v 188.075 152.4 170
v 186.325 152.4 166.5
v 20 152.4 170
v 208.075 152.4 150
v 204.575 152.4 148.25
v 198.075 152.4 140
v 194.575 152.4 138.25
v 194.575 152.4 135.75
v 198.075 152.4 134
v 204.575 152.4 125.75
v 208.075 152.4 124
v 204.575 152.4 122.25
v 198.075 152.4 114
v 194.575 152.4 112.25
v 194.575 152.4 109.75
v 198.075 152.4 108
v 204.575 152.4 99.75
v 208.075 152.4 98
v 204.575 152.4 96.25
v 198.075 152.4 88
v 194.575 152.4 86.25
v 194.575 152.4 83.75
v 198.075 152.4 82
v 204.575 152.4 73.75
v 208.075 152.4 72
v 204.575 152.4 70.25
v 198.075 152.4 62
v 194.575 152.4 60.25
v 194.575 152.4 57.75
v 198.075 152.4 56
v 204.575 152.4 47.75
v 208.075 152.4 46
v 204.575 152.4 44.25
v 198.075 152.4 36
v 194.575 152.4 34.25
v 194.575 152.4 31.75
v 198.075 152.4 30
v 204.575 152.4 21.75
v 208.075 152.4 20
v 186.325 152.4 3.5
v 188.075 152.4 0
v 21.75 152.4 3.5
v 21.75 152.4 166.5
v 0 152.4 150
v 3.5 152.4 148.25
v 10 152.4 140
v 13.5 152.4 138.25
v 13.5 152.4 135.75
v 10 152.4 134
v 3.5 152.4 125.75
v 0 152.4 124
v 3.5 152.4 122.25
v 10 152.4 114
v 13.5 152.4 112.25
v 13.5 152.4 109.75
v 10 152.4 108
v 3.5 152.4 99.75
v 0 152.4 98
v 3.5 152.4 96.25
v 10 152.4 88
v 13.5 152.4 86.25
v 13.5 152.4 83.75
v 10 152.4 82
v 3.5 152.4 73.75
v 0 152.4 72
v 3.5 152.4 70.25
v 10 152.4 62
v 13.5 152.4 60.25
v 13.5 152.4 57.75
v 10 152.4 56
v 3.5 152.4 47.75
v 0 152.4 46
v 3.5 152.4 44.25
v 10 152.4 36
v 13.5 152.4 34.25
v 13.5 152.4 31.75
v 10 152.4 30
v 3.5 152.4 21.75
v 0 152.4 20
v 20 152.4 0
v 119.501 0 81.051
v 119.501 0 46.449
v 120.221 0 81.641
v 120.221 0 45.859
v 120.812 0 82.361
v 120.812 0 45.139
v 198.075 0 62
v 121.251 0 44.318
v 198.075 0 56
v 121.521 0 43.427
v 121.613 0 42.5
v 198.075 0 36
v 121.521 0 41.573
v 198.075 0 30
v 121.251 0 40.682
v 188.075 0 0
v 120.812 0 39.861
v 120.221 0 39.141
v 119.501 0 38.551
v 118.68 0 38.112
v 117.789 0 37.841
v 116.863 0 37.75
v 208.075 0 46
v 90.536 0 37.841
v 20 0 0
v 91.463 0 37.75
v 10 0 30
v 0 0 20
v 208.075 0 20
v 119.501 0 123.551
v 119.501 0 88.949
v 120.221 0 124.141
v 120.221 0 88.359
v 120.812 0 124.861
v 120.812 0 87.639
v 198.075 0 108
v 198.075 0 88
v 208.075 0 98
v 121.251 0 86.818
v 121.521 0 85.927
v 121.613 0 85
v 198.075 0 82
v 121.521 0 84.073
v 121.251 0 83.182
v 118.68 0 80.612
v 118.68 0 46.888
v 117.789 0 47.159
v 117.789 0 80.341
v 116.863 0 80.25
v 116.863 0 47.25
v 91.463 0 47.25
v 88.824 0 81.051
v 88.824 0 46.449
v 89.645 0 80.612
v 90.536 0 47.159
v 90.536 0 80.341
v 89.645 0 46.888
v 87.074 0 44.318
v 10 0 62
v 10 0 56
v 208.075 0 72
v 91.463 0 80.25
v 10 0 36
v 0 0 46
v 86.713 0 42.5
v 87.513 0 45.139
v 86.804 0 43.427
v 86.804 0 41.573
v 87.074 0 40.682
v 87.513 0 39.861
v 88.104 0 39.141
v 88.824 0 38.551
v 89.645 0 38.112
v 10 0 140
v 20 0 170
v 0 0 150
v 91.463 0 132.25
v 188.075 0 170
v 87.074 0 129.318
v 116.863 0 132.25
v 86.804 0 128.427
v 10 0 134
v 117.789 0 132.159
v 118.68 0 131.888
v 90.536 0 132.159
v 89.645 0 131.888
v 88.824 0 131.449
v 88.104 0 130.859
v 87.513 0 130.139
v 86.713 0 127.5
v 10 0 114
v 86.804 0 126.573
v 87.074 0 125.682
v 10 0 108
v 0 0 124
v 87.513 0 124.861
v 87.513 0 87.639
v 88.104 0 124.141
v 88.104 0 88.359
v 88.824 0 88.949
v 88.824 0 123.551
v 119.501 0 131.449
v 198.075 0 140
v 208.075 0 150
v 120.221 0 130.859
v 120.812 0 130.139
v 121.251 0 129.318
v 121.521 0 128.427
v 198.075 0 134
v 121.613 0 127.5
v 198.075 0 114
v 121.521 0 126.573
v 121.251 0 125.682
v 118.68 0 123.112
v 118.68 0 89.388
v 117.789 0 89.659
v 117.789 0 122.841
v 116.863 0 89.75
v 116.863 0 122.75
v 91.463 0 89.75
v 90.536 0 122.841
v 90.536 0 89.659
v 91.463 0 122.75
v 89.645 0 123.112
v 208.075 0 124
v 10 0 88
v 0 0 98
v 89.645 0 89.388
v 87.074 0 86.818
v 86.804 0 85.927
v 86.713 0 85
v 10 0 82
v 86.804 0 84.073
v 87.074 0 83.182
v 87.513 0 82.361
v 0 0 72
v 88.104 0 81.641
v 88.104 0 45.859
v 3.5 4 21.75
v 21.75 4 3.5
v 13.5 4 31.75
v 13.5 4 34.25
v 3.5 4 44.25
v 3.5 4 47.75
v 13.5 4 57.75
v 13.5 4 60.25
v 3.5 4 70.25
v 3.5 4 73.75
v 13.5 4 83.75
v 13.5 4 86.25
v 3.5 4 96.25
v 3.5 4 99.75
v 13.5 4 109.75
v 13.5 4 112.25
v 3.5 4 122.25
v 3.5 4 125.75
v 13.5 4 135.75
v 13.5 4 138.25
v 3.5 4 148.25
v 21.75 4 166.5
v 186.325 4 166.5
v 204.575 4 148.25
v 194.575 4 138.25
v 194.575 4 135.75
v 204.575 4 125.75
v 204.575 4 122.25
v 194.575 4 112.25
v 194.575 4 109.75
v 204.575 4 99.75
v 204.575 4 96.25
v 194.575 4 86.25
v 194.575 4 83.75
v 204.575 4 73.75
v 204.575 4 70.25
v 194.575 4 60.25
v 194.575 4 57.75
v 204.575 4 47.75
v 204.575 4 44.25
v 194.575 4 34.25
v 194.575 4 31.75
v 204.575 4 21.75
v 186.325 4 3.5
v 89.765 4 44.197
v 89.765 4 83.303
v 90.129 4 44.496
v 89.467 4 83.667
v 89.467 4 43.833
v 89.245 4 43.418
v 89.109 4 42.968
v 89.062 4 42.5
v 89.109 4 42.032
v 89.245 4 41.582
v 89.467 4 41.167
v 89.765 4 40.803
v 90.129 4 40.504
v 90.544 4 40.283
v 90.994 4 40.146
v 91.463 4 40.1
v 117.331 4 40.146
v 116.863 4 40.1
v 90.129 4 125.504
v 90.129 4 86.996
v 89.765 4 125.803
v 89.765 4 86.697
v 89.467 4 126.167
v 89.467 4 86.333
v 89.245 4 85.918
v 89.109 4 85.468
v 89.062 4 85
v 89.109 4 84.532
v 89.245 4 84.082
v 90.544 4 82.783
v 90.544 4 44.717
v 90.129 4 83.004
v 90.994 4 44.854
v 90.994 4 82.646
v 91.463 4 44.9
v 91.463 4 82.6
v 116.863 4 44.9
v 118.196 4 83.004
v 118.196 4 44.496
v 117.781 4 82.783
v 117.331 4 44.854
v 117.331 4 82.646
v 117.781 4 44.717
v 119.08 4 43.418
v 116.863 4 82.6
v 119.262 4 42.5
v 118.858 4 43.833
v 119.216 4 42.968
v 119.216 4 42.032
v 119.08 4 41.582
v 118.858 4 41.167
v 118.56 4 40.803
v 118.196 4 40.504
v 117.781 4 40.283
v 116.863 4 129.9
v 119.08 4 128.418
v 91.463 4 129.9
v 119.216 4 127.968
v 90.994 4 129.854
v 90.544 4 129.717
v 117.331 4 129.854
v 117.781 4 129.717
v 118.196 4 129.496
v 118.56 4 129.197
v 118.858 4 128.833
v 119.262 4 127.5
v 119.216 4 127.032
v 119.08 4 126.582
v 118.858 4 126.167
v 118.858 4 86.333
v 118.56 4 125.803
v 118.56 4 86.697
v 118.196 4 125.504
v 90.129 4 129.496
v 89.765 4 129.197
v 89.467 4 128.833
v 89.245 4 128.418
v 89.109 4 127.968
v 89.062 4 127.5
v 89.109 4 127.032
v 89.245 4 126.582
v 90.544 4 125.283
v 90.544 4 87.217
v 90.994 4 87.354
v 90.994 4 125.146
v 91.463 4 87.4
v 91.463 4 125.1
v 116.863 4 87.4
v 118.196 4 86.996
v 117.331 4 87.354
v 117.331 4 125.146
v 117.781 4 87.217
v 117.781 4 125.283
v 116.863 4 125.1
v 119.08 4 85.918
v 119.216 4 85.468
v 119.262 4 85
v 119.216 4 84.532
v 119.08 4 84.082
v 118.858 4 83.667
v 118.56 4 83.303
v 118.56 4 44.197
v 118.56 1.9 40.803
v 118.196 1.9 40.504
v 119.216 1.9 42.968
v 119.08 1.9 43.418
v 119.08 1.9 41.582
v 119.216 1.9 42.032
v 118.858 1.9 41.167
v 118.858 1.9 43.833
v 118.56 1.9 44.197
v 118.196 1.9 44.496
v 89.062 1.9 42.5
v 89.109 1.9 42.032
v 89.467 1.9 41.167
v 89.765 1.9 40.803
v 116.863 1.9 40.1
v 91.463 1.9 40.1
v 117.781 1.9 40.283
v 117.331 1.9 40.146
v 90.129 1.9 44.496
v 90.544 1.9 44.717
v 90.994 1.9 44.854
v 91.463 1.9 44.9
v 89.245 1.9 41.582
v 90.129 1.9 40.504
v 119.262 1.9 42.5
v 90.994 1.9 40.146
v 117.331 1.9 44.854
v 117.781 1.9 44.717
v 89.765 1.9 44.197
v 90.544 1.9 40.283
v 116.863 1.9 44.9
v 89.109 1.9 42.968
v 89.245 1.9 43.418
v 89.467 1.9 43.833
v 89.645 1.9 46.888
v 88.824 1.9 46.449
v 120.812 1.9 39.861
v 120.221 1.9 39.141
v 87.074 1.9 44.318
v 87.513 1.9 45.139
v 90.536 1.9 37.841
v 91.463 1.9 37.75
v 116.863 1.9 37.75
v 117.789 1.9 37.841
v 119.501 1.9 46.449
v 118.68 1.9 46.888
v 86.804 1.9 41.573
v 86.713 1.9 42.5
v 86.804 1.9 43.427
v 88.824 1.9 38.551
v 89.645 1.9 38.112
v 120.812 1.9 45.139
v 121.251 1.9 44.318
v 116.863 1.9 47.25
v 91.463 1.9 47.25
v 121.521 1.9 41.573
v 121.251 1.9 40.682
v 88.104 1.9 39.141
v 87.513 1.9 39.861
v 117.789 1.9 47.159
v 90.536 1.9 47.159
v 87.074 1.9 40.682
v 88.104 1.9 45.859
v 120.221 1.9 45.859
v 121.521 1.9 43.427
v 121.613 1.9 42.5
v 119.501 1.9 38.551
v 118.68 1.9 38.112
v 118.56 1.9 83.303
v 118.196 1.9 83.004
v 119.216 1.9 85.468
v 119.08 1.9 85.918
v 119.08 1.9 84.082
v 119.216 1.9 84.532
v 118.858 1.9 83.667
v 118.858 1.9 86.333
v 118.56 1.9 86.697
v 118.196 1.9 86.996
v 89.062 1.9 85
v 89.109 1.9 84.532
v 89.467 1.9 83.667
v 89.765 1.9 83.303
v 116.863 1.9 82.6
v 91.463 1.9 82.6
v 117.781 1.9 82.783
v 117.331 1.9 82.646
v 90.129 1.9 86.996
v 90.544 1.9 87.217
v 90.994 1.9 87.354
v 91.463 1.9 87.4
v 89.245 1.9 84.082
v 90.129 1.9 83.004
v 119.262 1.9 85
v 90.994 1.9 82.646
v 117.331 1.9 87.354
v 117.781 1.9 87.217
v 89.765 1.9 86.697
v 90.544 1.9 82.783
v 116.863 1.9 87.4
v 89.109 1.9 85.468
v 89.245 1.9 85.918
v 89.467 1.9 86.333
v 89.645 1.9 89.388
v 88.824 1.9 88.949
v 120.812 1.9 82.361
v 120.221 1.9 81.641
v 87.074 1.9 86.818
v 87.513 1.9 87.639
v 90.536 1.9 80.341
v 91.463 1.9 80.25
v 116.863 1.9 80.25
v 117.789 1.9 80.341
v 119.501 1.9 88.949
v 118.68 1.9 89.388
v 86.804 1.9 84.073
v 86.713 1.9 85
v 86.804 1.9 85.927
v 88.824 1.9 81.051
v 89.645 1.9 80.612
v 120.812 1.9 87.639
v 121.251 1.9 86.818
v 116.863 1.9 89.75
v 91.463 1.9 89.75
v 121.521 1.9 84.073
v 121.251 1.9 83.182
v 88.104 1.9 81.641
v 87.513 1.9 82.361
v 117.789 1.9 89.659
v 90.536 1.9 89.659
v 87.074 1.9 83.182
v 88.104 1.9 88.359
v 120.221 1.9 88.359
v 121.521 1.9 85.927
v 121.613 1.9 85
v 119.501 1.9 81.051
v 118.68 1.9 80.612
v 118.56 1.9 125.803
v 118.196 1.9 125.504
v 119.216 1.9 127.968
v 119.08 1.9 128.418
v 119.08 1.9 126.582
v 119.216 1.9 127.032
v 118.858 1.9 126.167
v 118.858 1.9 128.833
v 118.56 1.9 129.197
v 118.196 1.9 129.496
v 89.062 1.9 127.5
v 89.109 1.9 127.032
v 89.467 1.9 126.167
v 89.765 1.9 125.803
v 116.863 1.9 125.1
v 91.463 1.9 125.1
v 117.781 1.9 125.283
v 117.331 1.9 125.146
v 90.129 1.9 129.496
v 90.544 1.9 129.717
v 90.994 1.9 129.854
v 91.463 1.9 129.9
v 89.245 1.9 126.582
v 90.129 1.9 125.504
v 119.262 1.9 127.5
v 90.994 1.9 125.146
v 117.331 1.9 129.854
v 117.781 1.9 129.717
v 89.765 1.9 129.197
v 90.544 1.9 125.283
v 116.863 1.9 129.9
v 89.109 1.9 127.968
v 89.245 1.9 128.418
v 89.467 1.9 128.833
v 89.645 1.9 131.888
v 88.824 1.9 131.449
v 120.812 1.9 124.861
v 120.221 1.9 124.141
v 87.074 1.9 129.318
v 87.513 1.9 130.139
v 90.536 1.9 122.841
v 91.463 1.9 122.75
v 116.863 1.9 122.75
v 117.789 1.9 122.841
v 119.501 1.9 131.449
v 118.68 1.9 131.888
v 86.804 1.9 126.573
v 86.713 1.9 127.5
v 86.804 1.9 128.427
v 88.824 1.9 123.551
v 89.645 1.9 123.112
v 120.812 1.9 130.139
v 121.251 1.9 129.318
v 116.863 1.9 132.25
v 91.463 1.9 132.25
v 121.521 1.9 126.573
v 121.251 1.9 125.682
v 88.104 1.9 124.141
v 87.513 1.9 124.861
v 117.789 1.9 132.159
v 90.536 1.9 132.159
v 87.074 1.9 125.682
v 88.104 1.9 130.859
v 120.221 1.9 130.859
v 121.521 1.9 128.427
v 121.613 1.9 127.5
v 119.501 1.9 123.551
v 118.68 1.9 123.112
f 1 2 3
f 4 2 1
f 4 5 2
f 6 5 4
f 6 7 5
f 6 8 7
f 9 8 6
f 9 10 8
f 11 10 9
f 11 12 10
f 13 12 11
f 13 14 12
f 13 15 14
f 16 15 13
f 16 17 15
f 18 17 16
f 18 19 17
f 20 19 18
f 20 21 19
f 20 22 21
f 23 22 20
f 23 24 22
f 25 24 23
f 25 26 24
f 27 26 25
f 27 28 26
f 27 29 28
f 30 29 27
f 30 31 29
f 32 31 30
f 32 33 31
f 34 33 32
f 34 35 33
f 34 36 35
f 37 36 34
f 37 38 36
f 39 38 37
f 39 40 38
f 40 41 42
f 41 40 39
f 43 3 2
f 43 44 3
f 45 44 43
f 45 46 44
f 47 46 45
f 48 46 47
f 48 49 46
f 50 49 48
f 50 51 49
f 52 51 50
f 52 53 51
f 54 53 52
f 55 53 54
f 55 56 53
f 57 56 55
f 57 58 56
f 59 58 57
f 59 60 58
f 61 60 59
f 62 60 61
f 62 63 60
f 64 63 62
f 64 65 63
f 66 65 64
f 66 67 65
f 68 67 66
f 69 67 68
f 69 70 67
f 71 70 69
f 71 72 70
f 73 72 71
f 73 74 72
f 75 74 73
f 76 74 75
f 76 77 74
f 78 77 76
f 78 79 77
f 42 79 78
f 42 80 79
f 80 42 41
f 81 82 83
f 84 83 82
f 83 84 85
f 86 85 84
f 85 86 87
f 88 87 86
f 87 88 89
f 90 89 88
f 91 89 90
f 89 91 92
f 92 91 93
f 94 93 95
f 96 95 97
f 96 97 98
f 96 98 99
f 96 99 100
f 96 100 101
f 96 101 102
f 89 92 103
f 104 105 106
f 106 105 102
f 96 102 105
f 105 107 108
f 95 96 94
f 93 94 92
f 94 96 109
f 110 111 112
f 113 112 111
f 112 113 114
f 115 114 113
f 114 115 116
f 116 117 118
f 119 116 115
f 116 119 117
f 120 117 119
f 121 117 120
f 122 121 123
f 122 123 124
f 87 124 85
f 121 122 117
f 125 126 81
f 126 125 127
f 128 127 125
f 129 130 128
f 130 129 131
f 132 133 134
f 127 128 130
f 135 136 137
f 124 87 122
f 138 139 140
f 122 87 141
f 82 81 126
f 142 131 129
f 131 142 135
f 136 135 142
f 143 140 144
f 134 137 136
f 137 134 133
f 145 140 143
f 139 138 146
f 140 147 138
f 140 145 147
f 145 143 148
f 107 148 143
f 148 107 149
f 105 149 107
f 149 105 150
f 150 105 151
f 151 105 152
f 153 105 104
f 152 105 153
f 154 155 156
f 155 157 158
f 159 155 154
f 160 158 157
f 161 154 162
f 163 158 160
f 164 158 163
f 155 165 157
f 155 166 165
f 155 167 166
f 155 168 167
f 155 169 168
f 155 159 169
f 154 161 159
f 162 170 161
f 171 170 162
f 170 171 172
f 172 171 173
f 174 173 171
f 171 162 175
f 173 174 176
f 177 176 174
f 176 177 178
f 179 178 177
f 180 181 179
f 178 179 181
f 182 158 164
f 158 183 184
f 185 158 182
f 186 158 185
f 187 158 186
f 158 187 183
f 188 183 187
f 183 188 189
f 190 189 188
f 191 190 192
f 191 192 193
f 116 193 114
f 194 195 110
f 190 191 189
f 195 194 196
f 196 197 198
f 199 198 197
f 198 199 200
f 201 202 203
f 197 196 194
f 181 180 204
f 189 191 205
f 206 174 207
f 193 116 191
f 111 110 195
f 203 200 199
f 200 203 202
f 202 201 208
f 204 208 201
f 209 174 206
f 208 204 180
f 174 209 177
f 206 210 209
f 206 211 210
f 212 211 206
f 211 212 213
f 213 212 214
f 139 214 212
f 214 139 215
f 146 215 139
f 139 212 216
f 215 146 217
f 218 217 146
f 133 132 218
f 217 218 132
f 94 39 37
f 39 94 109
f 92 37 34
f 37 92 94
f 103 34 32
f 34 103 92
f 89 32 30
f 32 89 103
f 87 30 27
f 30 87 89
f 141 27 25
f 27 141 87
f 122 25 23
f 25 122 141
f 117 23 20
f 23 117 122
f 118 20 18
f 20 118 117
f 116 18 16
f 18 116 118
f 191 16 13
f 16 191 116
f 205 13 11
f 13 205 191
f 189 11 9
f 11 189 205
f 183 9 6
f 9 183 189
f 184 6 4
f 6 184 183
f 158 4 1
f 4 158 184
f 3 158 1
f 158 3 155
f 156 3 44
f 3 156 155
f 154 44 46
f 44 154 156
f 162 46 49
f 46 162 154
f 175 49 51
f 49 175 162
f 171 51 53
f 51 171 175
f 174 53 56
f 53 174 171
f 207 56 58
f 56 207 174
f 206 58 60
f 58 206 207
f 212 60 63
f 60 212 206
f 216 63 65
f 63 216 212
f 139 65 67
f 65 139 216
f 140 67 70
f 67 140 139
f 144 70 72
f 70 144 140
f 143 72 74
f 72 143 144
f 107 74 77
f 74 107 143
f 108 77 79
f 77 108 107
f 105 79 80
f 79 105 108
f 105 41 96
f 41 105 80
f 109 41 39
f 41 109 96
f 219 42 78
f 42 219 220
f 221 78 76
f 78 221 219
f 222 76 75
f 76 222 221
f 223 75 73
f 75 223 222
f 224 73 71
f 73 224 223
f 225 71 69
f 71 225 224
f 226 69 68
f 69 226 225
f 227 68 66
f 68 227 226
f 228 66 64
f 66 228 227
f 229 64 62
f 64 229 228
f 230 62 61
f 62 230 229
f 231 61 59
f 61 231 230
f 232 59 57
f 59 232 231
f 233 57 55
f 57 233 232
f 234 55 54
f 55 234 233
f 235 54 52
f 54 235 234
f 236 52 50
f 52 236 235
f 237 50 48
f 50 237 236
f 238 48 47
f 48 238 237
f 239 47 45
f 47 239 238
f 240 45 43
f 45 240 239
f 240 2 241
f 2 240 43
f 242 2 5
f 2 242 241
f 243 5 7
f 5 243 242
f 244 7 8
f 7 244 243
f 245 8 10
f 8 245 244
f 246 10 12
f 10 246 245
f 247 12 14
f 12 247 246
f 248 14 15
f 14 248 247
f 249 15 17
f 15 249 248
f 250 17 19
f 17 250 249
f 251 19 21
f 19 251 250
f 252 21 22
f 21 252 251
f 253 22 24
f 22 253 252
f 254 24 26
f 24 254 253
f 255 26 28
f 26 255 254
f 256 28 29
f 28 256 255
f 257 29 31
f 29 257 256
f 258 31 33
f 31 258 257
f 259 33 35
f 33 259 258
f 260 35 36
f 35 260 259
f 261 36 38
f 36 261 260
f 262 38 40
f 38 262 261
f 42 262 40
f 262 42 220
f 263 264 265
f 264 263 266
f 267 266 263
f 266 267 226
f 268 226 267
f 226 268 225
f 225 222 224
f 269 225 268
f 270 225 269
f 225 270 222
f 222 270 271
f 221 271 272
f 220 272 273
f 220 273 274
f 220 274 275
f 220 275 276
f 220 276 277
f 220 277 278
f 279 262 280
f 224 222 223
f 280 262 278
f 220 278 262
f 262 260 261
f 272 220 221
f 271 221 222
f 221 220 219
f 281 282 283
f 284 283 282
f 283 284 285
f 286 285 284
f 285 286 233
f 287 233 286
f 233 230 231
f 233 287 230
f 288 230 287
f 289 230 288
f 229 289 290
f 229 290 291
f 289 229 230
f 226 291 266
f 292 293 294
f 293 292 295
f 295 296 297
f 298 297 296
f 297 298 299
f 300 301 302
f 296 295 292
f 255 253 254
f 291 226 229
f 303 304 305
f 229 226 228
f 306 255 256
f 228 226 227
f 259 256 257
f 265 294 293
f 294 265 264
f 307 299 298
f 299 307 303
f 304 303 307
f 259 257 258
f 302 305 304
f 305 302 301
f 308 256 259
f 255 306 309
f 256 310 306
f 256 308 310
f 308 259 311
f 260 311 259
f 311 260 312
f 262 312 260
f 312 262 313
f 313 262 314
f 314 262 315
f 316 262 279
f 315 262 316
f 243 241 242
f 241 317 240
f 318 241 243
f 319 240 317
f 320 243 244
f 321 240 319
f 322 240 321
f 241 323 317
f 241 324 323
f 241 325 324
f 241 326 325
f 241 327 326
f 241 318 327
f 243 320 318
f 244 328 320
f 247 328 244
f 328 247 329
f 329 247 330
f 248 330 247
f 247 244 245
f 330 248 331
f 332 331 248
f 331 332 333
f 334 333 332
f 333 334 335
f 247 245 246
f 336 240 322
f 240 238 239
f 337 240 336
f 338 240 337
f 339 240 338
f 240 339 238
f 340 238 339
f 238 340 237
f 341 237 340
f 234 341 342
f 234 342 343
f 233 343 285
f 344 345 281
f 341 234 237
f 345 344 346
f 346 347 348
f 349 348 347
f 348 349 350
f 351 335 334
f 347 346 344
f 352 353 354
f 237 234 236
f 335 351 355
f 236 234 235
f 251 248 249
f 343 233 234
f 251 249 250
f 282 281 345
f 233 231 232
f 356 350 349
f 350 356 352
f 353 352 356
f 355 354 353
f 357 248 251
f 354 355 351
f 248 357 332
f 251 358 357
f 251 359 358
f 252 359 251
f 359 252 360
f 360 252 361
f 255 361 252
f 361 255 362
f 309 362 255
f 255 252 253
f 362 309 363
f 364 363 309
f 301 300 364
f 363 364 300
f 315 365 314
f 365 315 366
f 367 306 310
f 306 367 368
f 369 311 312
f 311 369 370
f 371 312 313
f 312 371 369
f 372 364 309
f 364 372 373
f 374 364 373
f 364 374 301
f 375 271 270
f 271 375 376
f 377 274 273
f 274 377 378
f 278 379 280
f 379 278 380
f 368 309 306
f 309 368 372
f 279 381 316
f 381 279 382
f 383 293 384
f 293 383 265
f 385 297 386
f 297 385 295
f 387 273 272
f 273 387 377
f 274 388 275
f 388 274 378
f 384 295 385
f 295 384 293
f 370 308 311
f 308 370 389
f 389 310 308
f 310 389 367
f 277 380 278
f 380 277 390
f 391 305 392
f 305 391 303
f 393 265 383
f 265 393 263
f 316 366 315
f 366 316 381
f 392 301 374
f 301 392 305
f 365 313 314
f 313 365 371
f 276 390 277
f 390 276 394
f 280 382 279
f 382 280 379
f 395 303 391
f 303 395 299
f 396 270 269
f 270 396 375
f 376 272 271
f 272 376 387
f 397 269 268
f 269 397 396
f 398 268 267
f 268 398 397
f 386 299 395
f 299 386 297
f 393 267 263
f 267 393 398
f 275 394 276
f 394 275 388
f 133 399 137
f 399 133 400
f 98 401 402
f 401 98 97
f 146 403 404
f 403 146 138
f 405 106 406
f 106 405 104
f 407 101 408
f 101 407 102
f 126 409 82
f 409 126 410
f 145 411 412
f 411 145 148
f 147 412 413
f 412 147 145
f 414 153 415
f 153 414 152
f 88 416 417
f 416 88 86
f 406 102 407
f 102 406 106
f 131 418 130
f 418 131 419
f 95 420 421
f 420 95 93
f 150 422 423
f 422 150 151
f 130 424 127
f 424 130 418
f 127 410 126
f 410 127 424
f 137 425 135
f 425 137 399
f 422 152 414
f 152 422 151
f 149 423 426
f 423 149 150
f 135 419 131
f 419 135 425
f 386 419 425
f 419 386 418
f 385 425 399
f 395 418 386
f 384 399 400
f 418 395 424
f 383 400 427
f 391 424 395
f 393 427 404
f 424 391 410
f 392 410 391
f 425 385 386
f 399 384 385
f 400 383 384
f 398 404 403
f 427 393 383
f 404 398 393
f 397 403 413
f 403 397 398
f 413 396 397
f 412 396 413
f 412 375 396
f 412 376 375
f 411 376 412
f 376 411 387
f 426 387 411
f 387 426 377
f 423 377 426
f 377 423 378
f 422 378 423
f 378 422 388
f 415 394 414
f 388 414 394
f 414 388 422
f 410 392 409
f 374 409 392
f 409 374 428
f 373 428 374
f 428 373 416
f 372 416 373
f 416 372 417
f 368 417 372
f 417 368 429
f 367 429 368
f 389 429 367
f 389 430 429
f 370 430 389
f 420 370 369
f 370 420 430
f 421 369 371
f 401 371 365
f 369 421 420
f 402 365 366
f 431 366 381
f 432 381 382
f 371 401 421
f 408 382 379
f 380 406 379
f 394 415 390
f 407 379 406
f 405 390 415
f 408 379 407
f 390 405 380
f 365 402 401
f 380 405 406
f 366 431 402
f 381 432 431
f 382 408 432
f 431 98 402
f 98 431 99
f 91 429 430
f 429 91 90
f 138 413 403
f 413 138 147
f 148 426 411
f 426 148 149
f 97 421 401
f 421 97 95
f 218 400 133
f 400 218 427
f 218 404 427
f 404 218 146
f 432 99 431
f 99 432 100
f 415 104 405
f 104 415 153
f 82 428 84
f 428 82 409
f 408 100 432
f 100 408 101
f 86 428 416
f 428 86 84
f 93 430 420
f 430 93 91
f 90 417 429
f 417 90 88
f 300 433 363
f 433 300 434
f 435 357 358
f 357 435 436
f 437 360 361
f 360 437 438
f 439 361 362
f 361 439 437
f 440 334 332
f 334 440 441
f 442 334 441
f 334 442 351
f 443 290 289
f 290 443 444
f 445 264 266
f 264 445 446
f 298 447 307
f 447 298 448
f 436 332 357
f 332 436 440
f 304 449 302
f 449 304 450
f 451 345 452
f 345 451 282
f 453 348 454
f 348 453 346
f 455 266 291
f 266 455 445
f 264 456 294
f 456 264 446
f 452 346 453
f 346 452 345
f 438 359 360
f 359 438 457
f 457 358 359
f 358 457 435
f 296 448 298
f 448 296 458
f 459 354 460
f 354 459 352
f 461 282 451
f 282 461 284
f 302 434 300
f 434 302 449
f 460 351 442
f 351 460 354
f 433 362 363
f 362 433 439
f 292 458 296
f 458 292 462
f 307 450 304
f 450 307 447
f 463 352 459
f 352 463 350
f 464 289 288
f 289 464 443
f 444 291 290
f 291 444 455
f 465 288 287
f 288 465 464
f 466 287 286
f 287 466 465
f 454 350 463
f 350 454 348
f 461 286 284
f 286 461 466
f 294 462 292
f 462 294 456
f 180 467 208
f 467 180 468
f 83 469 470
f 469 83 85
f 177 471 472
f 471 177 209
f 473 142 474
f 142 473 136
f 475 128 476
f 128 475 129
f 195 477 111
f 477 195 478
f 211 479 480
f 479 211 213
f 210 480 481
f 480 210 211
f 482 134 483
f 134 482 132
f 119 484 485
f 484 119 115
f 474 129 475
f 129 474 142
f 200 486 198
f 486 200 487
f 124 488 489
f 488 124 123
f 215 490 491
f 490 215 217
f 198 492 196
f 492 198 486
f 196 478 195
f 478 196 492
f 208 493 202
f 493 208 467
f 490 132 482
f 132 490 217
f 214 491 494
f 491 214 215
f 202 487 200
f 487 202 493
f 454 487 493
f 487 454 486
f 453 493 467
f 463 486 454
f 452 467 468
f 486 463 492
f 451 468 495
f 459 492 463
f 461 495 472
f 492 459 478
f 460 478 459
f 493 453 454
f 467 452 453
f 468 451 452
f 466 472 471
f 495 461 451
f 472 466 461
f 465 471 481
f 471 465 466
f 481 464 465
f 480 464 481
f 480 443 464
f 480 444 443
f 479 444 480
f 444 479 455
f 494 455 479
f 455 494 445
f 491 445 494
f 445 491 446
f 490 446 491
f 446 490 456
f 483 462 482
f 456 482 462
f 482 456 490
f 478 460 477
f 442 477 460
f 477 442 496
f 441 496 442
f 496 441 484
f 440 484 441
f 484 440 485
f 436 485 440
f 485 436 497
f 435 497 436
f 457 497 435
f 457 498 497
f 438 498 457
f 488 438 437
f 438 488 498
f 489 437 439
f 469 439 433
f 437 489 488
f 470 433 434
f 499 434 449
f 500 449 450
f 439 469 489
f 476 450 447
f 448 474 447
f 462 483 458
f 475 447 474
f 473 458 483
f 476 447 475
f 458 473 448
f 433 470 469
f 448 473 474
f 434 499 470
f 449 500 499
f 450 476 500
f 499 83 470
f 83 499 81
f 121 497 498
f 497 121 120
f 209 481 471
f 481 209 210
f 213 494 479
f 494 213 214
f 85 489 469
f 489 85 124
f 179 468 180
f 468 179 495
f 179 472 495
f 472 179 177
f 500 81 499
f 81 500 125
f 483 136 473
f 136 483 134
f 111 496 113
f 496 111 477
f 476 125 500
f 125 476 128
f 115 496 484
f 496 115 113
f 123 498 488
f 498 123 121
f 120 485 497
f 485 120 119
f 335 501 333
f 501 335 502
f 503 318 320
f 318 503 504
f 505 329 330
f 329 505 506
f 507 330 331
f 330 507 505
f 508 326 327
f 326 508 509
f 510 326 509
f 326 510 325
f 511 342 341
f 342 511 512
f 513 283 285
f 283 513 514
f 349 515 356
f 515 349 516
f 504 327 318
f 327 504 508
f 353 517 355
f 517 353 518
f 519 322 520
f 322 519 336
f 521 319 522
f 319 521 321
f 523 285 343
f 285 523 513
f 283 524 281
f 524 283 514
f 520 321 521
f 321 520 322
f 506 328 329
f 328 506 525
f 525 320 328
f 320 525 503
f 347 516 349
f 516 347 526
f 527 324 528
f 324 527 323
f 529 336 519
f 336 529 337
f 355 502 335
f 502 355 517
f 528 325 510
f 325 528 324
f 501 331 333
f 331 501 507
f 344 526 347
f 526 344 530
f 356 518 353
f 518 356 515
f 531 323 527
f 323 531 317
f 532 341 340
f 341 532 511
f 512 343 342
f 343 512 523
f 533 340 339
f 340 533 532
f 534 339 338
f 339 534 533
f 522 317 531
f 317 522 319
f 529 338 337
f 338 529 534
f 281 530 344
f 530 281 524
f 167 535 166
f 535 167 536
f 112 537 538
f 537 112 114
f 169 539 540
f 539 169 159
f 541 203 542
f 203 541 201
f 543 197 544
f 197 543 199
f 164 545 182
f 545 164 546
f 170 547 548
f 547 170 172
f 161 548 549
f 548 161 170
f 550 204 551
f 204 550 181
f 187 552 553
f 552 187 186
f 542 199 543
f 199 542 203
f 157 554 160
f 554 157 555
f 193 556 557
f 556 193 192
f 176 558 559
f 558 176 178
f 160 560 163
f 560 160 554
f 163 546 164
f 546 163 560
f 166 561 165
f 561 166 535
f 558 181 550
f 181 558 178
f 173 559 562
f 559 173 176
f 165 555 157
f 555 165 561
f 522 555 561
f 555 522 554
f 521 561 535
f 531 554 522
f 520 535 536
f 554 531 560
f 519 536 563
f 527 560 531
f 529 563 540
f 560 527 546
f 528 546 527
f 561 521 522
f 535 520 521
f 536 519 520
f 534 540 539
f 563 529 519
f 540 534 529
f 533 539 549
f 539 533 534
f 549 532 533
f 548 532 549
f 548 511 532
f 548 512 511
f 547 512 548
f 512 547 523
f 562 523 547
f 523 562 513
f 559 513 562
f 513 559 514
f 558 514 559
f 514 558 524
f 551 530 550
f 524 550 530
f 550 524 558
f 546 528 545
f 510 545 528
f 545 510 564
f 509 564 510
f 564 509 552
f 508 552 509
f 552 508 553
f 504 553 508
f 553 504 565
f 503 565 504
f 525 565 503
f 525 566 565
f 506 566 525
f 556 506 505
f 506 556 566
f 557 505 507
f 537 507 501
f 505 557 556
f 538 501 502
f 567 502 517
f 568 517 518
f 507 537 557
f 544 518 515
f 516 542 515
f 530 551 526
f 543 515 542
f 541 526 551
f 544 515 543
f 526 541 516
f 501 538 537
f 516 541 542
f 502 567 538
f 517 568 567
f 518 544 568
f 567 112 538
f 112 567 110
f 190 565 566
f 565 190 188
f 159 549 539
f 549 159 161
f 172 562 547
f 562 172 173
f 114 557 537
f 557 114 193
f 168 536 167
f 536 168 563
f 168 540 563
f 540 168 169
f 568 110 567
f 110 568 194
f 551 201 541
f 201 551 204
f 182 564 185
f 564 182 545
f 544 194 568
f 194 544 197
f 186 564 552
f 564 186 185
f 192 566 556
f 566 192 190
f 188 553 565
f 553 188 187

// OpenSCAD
/*
   ====================================================================
   Modular 3D-Printable Shelving System - Single Module
   ====================================================================
   Author: Parametric 3D Printable Modular Shelf
   Designed for: 26cm x 26cm Print Beds & 16" Wall Stud Spacing
   
   Features:
   - Recomputed Width for 16-Inch 2-Block Interlocked Module Span
     Single Width W = (16" + tooth_depth + clearance) / 2 = 208.325mm (8.20")
     Fits easily flat on 26cm x 26cm print beds
   - Key-Tooth Side Profile: Straight 45-degree angled ramps with flat lands
   - Parameterable Number of Teeth (`num_teeth`) which divides side height
   - Convex polygon frame with 4 corner chamfers (octagonal end caps)
   - Option for flat end walls (`flat_left_wall`, `flat_right_wall`)
   - 3 Horizontal Slits per module for Left-to-Right wall adjustment
     (located at 1/4, 1/2, and 3/4 of the module height)
   ====================================================================
*/

/* [Key-Teeth Profile Parameters] */
// Number of key teeth along side wall (integer divider of side height)
num_teeth = 5;         // [2:1:10]

// Height of each tooth in mm
tooth_height = 26.0;   // [15.0:1.0:40.0]

// Inward depth of each key tooth in mm (45-degree angle -> ramp height = depth)
tooth_depth = 10.0;    // [4.0:1.0:20.0]

/* [16-Inch 2-Block Width Calculation] */
// Target combined width for 2 interlocked modules in inches (default 16.0")
target_2block_span_in = 16.0;

// Size of 4 corner chamfers/bevels in mm
corner_bevel_size = 20.0; // [5.0:1.0:40.0]

// Depth of shelf box in inches
module_depth_in = 6.0;   // [4.0:0.25:12.0]

/* [Wall Thickness & Details] */
// Main wall thickness in mm
wall_thickness = 3.5;  // [2.0:0.5:6.0]

// Back wall mounting plate thickness in mm
back_thickness = 4.0;  // [2.0:0.5:8.0]

// Clearance tolerance between interlocking teeth in mm (0.2-0.3mm snug fit)
interlock_clearance = 0.25; // [0.1:0.05:0.5]

/* [End Wall Options] */
// Make left side wall flat (end cap for left of shelf row)
flat_left_wall = false;

// Make right side wall flat (end cap for right of shelf row)
flat_right_wall = false;

/* [Mounting & Horizontal Adjustment Slits] */
// Mounting hole style: "three_horizontal_slits" (at 1/4, 1/2, 3/4 height), "single_horizontal_slit", "none"
mount_hole_style = "three_horizontal_slits"; // [three_horizontal_slits, single_horizontal_slit, none]

// Horizontal slit adjustment width in mm (1" = 25.4mm slot)
screw_slot_width = 25.4; // [10.0:1.0:50.0]

// Screw shaft diameter in mm (#8 / M4.5 screw = 4.5mm)
screw_shaft_dia = 4.5;   // [3.0:0.5:6.0]

// Screw head diameter in mm (counterbore recess)
screw_head_dia = 9.0;    // [6.0:0.5:12.0]

/* [Print Bed & Display Options] */
// Display mode: "3d" (upright), "print_flat" (back wall down), "print_diagonal" (rotated 45 deg flat)
render_mode = "3d"; // [3d, print_flat, print_diagonal]

// Printer bed X size in mm
bed_size_x = 260;

// Printer bed Y size in mm
bed_size_y = 260;

// ====================================================================
// DERIVED CALCULATIONS & MATHEMATICAL HELPERS
// ====================================================================

// Total side wall height (divided by num_teeth)
h_wall = num_teeth * tooth_height;

// Total Module Height derived from teeth count and corner bevels
H = 2 * corner_bevel_size + h_wall;
module_height_in = H / 25.4;

// Recalculated module width W so 2 interlocked blocks span exactly 16 inches (406.4 mm)
span_2block_mm = target_2block_span_in * 25.4;
W = (span_2block_mm + tooth_depth + interlock_clearance) / 2;
module_width_in = W / 25.4;

D = module_depth_in * 25.4;

// Display diagnostic information in OpenSCAD console
echo("=================================================");
echo(str("2-BLOCK SPAN TARGET: ", target_2block_span_in, "\" (", span_2block_mm, " mm)"));
echo(str("RECOMPUTED SINGLE MODULE WIDTH: W = ", W, " mm (", module_width_in, " inches)"));
echo(str("KEY TEETH METRICS: Teeth Count = ", num_teeth, ", Tooth Height = ", tooth_height, " mm, 45-Deg Ramp = ", tooth_depth, " mm"));
echo(str("MODULE DIMENSIONS: ", module_width_in, "\" W x ", module_height_in, "\" H (", H, "mm) x ", module_depth_in, "\" D"));
echo(str("PRINT BED FIT (260x260mm): Flat width = ", W, "mm, Flat height = ", H, "mm"));
if (H <= bed_size_y && W <= bed_size_x) {
    echo("-> FIT STATUS: DIRECT FLAT FIT on 26cm x 26cm bed!");
} else {
    echo("-> FIT STATUS: DIAGONAL / STANDING FIT required for 26cm bed");
}
echo("=================================================");

// Generate 2D outer boundary points for key-tooth profile (straight 45-deg angles)
function outer_profile(W, H, bevel, n_teeth, t_h, depth, clr, flat_l=false, flat_r=false) =
    let (
        z_b = bevel,
        z_t = H - bevel,
        ramp = min(depth, t_h / 2)
    )
    concat(
        // 1. Bottom flat edge (left to right)
        [ [ bevel, 0 ] ],
        [ [ W - bevel - clr, 0 ] ],
        
        // 2. Bottom-right chamfer
        [ [ W - clr, z_b ] ],
        
        // 3. Right side wall (key teeth going up)
        flat_r ? [ [ W - clr, z_t ] ] :
        [ for (k = [0 : n_teeth - 1]) for (pt = [
            [ W - clr, z_b + k * t_h ],
            [ W - ramp - clr, z_b + k * t_h + ramp ],
            [ W - ramp - clr, z_b + (k + 1) * t_h - ramp ],
            [ W - clr, z_b + (k + 1) * t_h ]
        ]) pt ],
        
        // 4. Top-right chamfer
        [ [ W - bevel - clr, H ] ],
        
        // 5. Top flat edge (right to left)
        [ [ bevel, H ] ],
        
        // 6. Top-left chamfer
        [ [ 0, z_t ] ],
        
        // 7. Left side wall (key teeth going down)
        flat_l ? [ [ 0, z_b ] ] :
        [ for (k = [n_teeth - 1 : -1 : 0]) for (pt = [
            [ 0, z_b + (k + 1) * t_h ],
            [ ramp, z_b + (k + 1) * t_h - ramp ],
            [ ramp, z_b + k * t_h + ramp ],
            [ 0, z_b + k * t_h ]
        ]) pt ]
    );

// Generate 2D inner cavity boundary points in [X, Z] plane
function inner_profile(W, H, wall, bevel, n_teeth, t_h, depth, clr, flat_l=false, flat_r=false) =
    let (
        z_b = bevel,
        z_t = H - bevel,
        ramp = min(depth, t_h / 2)
    )
    concat(
        // 1. Inner bottom flat edge
        [ [ bevel + wall/2, wall ] ],
        [ [ W - bevel - wall/2 - clr, wall ] ],
        
        // 2. Inner bottom-right chamfer
        [ [ W - wall - clr, z_b + wall/2 ] ],
        
        // 3. Inner right side wall
        flat_r ? [ [ W - wall - clr, z_t - wall/2 ] ] :
        [ for (k = [0 : n_teeth - 1]) for (pt = [
            [ W - wall - clr, z_b + k * t_h + wall/2 ],
            [ W - wall - ramp - clr, z_b + k * t_h + ramp + wall/2 ],
            [ W - wall - ramp - clr, z_b + (k + 1) * t_h - ramp - wall/2 ],
            [ W - wall - clr, z_b + (k + 1) * t_h - wall/2 ]
        ]) pt ],
        
        // 4. Inner top-right chamfer
        [ [ W - bevel - wall/2 - clr, H - wall ] ],
        
        // 5. Inner top flat edge
        [ [ bevel + wall/2, H - wall ] ],
        
        // 6. Inner top-left chamfer
        [ [ wall, z_t - wall/2 ] ],
        
        // 7. Inner left side wall
        flat_l ? [ [ wall, z_b + wall/2 ] ] :
        [ for (k = [n_teeth - 1 : -1 : 0]) for (pt = [
            [ wall, z_b + (k + 1) * t_h - wall/2 ],
            [ wall + ramp, z_b + (k + 1) * t_h - ramp - wall/2 ],
            [ wall + ramp, z_b + k * t_h + ramp + wall/2 ],
            [ wall, z_b + k * t_h + wall/2 ]
        ]) pt ]
    );

// Horizontal Slit Cutter module (enables left-to-right alignment adjustment)
module horizontal_slit_cutter(x, z, shaft_d, head_d, slot_w, wall_t) {
    translate([x, -0.1, z])
    rotate([-90, 0, 0])
    union() {
        // Main slot for screw shaft (left-to-right slide)
        hull() {
            translate([-slot_w/2, 0, 0])
                cylinder(d = shaft_d + 0.3, h = wall_t + 0.5, $fn = 32);
            translate([slot_w/2, 0, 0])
                cylinder(d = shaft_d + 0.3, h = wall_t + 0.5, $fn = 32);
        }
        // Counterbore recess for screw head / washer to sit flush
        hull() {
            translate([-slot_w/2, 0, -0.1])
                cylinder(d = head_d + 0.5, h = wall_t/2 + 0.1, $fn = 32);
            translate([slot_w/2, 0, -0.1])
                cylinder(d = head_d + 0.5, h = wall_t/2 + 0.1, $fn = 32);
        }
    }
}

// Single Module Geometry Generator (X = Width, Y = Depth [0 to D], Z = Height [0 to H])
module single_module(
    width_in = module_width_in,
    depth_in = module_depth_in,
    n_teeth = num_teeth,
    t_h = tooth_height,
    t_d = tooth_depth,
    wall_t = wall_thickness,
    back_t = back_thickness,
    bevel = corner_bevel_size,
    flat_l = flat_left_wall,
    flat_r = flat_right_wall,
    clr = interlock_clearance,
    mount_style = mount_hole_style,
    slot_w = screw_slot_width
) {
    local_h_wall = n_teeth * t_h;
    local_H = 2 * bevel + local_h_wall;
    
    // Width derived from 16-inch 2-block span equation if width_in is omitted
    local_W = (width_in > 0) ? (width_in * 25.4) : ((target_2block_span_in * 25.4 + t_d + clr) / 2);
    local_D = depth_in * 25.4;
    
    difference() {
        union() {
            // Main extruded hollow shell box (extrude along Y from 0 to local_D)
            rotate([90, 0, 0])
            translate([0, 0, -local_D])
            linear_extrude(height = local_D) {
                difference() {
                    polygon(outer_profile(local_W, local_H, bevel, n_teeth, t_h, t_d, clr, flat_l, flat_r));
                    polygon(inner_profile(local_W, local_H, wall_t, bevel, n_teeth, t_h, t_d, clr, flat_l, flat_r));
                }
            }
            
            // Back wall plate (at Y=0, thickness back_t)
            rotate([90, 0, 0])
            translate([0, 0, -back_t])
            linear_extrude(height = back_t) {
                polygon(outer_profile(local_W, local_H, bevel, n_teeth, t_h, t_d, clr, flat_l, flat_r));
            }
        }
        
        // Mounting Cutouts (3 Horizontal Slits: 1/4, 1/2, 3/4 height)
        if (mount_style == "three_horizontal_slits") {
            // Slit 1 at 1/4 (25%) height
            horizontal_slit_cutter(local_W / 2, local_H * 0.25, screw_shaft_dia, screw_head_dia, slot_w, back_t);
            // Slit 2 at middle (50%) height
            horizontal_slit_cutter(local_W / 2, local_H * 0.50, screw_shaft_dia, screw_head_dia, slot_w, back_t);
            // Slit 3 at 3/4 (75%) height
            horizontal_slit_cutter(local_W / 2, local_H * 0.75, screw_shaft_dia, screw_head_dia, slot_w, back_t);
        } else if (mount_style == "single_horizontal_slit") {
            horizontal_slit_cutter(local_W / 2, local_H * 0.50, screw_shaft_dia, screw_head_dia, slot_w, back_t);
        }
    }
}

// Render according to selected mode
if (render_mode == "3d") {
    single_module();
} else if (render_mode == "print_flat") {
    // Rotated flat on back plate (Y=0 becomes Z=0)
    rotate([-90, 0, 0])
    single_module();
} else if (render_mode == "print_diagonal") {
    // Rotated 45 degrees flat on build bed for maximum diagonal fit
    rotate([0, 0, 45])
    rotate([-90, 0, 0])
    single_module();
}
